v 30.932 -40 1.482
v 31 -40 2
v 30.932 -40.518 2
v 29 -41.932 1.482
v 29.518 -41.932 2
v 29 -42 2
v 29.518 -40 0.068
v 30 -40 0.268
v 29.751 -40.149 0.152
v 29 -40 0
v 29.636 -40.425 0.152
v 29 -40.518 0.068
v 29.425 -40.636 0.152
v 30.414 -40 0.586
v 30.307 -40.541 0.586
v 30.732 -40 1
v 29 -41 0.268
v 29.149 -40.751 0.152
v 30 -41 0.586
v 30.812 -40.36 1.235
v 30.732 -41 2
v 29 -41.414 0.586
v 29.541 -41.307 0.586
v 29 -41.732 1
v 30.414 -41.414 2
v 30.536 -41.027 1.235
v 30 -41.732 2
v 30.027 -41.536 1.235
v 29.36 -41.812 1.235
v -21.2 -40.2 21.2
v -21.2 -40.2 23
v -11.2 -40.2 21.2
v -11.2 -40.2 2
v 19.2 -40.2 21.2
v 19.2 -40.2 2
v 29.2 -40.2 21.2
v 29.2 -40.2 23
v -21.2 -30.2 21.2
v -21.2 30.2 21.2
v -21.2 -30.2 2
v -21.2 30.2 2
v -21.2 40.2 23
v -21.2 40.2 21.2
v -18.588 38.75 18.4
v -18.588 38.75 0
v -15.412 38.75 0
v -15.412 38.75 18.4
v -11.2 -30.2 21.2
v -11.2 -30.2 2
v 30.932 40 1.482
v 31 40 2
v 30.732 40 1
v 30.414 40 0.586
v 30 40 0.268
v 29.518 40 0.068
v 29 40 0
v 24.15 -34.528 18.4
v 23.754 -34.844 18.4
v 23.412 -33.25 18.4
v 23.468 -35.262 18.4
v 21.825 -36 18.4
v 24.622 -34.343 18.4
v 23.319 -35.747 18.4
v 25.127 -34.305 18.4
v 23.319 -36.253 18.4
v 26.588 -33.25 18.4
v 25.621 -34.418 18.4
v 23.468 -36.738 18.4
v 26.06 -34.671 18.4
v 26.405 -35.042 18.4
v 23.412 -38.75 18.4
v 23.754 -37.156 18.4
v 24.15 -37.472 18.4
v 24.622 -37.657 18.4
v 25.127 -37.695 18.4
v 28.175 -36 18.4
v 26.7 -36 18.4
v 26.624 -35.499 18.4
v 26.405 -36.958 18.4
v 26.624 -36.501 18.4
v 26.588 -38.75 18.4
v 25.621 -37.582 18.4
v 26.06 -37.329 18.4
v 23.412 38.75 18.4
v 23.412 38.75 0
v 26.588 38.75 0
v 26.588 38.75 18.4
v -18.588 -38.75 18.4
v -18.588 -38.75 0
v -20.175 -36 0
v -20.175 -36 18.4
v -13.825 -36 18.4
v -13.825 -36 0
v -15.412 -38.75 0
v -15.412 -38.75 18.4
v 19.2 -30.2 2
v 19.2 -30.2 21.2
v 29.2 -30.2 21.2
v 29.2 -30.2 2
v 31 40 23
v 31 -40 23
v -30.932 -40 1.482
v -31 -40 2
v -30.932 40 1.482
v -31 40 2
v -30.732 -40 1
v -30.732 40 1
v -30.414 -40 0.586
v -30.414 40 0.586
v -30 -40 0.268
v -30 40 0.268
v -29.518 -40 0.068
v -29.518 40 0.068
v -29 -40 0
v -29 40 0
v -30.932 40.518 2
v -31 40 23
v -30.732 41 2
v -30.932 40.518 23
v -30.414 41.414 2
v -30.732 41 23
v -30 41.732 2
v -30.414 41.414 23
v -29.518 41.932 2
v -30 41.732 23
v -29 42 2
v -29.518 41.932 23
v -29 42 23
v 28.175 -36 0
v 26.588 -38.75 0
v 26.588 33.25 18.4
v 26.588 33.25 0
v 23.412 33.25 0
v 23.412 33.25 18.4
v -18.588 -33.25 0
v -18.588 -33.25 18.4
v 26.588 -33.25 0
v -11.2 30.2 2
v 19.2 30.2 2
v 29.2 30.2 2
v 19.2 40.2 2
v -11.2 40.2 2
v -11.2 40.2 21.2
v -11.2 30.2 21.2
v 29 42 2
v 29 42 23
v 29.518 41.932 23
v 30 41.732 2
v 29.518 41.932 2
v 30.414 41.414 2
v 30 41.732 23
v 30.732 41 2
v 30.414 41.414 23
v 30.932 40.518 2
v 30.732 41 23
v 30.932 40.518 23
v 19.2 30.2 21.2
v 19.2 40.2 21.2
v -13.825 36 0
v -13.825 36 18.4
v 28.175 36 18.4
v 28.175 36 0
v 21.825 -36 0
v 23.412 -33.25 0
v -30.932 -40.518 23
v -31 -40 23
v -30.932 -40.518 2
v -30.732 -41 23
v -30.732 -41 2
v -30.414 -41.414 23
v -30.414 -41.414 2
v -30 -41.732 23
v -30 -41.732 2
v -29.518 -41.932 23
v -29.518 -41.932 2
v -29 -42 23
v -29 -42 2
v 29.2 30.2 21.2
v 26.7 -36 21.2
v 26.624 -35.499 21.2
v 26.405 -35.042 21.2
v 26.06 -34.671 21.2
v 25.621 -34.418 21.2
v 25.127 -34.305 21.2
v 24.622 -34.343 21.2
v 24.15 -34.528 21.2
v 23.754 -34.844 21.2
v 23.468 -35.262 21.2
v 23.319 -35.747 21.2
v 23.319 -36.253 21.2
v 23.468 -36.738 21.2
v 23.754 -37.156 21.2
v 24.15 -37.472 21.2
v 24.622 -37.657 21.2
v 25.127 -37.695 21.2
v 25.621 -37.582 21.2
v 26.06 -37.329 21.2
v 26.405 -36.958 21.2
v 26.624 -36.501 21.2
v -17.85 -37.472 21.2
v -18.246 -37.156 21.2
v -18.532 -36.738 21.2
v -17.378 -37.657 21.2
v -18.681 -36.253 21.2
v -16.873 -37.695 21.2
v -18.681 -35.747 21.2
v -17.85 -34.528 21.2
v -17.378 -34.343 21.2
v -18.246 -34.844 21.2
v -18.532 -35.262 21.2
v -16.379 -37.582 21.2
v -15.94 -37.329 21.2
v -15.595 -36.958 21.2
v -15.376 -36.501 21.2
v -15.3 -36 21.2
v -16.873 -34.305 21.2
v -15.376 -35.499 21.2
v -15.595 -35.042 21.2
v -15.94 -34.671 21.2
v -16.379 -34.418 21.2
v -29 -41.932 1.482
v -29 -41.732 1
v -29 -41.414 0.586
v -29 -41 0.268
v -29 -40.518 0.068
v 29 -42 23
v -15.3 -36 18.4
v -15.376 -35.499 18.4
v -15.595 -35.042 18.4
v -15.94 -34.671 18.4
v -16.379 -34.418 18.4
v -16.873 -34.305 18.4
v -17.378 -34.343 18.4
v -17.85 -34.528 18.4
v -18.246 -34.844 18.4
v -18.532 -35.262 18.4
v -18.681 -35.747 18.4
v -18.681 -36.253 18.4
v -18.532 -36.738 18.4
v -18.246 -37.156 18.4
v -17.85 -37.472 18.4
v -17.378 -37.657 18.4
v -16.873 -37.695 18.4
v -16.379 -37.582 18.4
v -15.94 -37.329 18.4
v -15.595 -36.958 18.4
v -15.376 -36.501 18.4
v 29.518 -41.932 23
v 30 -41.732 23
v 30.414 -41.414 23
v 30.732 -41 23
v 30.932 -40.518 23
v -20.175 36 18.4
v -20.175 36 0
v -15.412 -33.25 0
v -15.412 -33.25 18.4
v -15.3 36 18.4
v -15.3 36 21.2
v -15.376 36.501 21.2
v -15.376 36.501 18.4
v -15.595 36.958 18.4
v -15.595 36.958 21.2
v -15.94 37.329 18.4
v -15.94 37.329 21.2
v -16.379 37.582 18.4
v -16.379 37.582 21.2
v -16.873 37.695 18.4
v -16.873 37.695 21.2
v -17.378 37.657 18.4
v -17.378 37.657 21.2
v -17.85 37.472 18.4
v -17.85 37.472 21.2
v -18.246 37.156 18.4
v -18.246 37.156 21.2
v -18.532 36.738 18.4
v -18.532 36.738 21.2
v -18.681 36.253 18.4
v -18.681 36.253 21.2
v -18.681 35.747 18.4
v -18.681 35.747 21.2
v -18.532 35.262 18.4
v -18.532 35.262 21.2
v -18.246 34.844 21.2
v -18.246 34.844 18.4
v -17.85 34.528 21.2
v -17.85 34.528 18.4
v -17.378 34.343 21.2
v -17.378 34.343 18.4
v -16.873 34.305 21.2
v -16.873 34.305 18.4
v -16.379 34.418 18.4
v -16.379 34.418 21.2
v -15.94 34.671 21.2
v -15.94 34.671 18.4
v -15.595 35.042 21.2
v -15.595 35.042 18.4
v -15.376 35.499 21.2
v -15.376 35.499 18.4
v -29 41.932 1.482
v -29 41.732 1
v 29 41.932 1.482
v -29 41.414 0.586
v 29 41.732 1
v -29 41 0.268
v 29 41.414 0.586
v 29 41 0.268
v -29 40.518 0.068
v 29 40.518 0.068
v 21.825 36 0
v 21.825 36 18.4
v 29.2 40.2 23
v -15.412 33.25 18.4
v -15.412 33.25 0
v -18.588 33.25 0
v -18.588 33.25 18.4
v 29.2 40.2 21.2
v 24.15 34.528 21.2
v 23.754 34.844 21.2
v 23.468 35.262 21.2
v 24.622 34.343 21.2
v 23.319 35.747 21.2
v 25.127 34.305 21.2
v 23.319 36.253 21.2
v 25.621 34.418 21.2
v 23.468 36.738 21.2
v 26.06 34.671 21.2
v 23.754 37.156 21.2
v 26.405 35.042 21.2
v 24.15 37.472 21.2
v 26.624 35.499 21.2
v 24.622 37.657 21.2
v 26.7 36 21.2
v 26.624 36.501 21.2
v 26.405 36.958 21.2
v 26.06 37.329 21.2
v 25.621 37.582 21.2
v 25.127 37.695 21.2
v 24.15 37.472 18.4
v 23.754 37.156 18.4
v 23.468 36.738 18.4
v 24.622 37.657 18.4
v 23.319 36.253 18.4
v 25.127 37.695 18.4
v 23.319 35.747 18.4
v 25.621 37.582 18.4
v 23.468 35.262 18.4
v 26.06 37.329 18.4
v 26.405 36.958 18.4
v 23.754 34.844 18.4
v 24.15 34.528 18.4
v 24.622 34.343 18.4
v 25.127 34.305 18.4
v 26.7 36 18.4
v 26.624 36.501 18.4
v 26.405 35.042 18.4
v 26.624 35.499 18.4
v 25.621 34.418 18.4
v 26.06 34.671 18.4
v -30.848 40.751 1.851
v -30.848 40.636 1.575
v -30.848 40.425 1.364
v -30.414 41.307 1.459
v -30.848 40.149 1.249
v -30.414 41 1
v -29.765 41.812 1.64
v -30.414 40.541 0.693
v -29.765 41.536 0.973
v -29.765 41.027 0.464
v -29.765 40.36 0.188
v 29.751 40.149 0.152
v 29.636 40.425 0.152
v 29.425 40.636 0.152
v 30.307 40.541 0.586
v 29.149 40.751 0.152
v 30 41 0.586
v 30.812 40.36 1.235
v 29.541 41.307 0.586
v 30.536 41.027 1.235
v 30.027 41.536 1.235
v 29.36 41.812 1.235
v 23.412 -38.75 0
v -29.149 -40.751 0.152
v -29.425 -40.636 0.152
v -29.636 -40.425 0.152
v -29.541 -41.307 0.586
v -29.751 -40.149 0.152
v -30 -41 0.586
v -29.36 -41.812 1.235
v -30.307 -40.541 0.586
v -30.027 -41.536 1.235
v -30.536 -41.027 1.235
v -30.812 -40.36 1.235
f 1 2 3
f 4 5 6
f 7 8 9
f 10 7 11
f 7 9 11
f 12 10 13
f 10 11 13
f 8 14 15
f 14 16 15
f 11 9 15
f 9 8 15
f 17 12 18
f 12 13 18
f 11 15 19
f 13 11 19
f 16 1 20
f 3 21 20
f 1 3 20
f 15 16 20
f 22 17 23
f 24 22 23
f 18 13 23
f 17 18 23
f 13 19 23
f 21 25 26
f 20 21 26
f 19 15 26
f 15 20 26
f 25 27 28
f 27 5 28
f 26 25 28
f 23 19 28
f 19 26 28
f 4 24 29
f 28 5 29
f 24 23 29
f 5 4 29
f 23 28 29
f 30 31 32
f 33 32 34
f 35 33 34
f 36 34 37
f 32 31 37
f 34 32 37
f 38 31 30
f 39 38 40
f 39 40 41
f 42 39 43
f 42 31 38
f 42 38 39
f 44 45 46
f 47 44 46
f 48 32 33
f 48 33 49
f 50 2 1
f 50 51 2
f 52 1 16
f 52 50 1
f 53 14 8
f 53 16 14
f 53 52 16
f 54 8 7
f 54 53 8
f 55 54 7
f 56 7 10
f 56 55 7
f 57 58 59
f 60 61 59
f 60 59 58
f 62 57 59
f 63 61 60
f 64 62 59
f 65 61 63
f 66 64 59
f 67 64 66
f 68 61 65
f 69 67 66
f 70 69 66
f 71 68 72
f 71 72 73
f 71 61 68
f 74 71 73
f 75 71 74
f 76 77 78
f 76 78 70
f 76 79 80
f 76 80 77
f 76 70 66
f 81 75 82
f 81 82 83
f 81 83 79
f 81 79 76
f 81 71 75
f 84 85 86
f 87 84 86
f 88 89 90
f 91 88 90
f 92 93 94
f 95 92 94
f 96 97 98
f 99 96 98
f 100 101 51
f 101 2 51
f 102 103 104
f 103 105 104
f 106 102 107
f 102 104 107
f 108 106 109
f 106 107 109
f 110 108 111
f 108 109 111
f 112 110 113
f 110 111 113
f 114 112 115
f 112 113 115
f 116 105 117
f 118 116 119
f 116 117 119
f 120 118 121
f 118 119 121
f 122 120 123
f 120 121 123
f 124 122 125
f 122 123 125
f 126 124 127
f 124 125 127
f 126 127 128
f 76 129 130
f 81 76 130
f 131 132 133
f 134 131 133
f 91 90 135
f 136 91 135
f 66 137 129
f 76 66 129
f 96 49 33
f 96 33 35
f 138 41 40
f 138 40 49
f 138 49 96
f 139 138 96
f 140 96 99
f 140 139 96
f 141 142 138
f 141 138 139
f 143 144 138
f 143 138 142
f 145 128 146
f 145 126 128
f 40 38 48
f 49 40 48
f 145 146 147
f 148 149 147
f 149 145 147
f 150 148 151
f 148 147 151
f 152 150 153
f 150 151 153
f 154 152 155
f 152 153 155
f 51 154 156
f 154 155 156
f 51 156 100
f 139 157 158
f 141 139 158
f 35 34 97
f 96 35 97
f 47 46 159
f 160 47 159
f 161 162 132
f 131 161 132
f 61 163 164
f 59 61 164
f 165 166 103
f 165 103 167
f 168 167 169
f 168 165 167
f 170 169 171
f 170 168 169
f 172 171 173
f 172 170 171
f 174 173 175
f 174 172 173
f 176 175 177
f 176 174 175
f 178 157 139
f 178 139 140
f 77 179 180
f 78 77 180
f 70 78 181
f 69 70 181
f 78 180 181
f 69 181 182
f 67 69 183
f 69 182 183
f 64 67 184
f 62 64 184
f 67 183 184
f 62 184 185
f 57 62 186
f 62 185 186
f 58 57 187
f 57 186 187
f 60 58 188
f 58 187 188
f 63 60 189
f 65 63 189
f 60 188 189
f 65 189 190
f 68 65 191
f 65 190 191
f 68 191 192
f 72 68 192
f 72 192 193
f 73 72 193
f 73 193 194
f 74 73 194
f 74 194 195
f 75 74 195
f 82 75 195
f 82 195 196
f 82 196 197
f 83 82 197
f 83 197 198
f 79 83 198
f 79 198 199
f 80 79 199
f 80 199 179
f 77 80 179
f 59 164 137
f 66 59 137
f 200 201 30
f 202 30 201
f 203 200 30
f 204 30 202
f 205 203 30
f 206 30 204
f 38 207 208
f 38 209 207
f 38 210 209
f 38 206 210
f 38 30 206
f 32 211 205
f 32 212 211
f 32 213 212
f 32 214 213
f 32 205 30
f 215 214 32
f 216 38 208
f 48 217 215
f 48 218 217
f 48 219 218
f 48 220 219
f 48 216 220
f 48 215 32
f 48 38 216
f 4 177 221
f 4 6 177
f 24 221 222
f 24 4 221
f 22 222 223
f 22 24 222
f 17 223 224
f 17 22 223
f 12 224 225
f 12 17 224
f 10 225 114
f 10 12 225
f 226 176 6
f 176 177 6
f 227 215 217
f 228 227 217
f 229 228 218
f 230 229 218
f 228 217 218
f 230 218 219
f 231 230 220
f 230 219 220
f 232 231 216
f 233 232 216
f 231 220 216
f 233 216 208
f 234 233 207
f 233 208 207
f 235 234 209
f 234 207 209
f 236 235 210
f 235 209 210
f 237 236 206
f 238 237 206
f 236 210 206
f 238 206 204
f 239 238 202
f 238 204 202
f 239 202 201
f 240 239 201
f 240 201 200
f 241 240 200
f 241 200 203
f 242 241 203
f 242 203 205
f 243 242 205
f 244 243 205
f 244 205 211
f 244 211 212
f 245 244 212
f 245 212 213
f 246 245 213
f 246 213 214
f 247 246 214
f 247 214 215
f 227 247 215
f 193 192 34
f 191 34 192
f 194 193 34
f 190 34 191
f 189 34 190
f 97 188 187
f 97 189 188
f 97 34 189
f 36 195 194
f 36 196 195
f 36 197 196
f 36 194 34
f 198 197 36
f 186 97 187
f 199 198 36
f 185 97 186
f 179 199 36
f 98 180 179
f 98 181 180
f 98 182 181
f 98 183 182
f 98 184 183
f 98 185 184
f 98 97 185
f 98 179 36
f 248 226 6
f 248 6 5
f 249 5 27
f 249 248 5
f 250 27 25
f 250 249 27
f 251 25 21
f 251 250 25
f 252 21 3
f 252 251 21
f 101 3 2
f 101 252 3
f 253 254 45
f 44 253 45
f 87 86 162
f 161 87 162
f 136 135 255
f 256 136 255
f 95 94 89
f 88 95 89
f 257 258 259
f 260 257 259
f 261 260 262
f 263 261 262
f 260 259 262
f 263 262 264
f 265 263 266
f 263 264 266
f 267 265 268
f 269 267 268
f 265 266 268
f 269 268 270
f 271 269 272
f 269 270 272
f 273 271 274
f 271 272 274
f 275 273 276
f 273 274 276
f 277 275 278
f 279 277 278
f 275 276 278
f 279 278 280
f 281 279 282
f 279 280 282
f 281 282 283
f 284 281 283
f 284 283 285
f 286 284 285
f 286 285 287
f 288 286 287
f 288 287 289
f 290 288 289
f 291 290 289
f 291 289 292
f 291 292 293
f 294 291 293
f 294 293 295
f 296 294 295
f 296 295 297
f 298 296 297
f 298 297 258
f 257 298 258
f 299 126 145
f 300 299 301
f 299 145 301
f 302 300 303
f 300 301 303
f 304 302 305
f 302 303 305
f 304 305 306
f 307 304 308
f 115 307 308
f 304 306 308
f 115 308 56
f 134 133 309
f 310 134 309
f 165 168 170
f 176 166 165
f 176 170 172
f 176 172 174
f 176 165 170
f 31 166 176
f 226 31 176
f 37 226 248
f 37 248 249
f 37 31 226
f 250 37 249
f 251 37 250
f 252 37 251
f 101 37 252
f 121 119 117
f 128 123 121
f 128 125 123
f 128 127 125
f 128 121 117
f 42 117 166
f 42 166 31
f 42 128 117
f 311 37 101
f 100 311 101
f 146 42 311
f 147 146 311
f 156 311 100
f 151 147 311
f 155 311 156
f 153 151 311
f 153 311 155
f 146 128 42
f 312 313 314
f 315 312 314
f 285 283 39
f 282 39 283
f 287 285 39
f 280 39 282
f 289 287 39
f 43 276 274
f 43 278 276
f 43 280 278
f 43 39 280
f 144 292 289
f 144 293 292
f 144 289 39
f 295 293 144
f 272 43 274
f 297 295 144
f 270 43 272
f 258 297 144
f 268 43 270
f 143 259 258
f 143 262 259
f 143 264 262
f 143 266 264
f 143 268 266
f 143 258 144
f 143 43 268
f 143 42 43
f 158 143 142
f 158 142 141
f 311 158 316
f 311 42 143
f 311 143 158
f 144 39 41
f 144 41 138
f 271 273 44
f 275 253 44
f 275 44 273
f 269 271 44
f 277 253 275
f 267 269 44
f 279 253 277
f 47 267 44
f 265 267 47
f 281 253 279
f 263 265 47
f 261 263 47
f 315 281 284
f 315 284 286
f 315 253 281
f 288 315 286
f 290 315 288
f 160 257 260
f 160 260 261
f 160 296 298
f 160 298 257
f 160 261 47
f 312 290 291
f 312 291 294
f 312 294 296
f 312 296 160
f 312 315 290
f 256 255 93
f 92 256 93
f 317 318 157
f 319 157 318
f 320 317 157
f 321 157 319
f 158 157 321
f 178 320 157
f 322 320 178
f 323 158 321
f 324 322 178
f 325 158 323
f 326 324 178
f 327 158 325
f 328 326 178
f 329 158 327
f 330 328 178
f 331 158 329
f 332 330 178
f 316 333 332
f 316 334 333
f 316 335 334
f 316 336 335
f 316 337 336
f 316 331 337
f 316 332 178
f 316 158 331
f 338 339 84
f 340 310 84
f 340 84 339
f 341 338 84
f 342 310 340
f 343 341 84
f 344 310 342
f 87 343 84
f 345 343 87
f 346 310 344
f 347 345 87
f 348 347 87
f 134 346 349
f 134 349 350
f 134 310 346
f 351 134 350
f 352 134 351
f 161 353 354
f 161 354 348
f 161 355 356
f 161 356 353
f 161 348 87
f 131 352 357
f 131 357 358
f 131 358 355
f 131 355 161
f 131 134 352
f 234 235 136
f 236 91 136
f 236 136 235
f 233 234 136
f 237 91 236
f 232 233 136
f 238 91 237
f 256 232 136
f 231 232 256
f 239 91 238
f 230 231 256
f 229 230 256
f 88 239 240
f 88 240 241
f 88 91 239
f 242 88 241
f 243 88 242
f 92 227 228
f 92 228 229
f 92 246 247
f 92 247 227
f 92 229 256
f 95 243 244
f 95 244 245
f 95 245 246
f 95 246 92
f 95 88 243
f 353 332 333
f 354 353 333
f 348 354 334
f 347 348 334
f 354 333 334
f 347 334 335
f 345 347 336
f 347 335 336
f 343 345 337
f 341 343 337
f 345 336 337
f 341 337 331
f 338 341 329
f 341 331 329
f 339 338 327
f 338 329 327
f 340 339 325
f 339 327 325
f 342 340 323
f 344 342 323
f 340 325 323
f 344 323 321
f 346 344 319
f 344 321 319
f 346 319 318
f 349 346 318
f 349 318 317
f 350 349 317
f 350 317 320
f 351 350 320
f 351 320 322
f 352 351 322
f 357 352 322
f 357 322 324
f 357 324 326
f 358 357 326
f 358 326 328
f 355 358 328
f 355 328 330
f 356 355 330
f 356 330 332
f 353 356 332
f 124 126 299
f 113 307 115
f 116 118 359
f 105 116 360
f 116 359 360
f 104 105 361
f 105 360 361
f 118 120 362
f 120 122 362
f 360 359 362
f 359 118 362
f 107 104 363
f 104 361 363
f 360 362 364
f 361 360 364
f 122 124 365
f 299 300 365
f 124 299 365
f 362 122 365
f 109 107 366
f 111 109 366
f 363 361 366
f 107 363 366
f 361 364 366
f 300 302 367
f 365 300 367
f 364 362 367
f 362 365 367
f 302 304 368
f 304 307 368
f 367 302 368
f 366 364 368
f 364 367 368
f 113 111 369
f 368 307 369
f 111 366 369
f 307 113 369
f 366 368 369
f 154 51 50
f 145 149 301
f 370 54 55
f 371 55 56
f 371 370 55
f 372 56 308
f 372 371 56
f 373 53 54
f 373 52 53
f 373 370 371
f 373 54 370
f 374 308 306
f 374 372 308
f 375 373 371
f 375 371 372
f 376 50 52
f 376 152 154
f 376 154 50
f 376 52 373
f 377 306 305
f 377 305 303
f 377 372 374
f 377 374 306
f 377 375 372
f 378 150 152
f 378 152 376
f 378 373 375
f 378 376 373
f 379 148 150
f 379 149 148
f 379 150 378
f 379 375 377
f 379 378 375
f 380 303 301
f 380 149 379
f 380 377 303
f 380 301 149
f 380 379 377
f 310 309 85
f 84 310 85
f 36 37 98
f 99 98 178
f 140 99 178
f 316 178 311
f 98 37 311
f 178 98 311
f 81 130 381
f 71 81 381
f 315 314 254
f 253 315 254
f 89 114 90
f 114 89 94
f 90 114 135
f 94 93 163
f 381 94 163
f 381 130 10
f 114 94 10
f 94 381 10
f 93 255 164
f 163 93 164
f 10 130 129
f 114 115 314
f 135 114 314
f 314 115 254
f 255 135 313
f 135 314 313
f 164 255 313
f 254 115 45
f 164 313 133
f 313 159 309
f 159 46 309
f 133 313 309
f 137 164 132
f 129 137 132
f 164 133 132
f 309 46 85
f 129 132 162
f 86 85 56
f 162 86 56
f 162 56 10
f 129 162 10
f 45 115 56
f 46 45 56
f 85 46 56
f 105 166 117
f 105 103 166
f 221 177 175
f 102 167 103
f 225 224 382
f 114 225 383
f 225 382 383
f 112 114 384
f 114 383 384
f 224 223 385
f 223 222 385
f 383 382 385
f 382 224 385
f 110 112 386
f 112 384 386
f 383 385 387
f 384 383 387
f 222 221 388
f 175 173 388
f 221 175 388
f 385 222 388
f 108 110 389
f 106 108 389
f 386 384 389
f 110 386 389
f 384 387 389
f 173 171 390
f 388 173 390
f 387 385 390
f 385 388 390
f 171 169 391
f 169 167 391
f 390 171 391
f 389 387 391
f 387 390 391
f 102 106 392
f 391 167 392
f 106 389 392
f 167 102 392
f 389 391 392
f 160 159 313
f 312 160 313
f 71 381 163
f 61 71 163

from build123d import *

# Parameters (mm, degrees)
SKETCH024_W     = 62
SKETCH024_H     = 84
PAD007_DEPTH    = 23
SKETCH025_W     = 50.4
SKETCH025_H     = 80.4
POCKET015_DEPTH = 21
SKETCH026_W     = 10
SKETCH026_H     = 10
PAD008_DEPTH    = 19.2
SKETCH027_R     = 1.7
POCKET016_DEPTH = 21.2
POCKET017_DEPTH = 18.4
FILLET004_R     = 2


with BuildPart() as part:
    # Sketch024 → Pad007 (new body)
    with BuildSketch(Plane.XY):
        Rectangle(SKETCH024_W, SKETCH024_H)
    extrude(amount=PAD007_DEPTH)

    # Sketch025 (on Face6 of Pad007) → Pocket015 (cut)
    with BuildSketch(Plane.XY.offset(23)):
        with Locations((4, 0)):
            Rectangle(SKETCH025_W, SKETCH025_H)
    extrude(amount=-POCKET015_DEPTH, mode=Mode.SUBTRACT)

    # Sketch026 (on Face11 of Pocket015) → Pad008 (join)
    with BuildSketch(Plane.XY.offset(2)):
        with Locations((-16.2, 35.2)):
            Rectangle(SKETCH026_W, SKETCH026_H)
        with Locations((24.2, 35.2)):
            Rectangle(SKETCH026_W, SKETCH026_H)
        with Locations((24.2, -35.2)):
            Rectangle(SKETCH026_W, SKETCH026_H)
        with Locations((-16.2, -35.2)):
            Rectangle(SKETCH026_W, SKETCH026_H)
    extrude(amount=PAD008_DEPTH)

    # Sketch027 (on Face19 of Pad008) → Pocket016 (cut)
    with BuildSketch(Plane.XY.offset(21.2)):
        with Locations((25, 36)):
            Circle(SKETCH027_R)
        with Locations((-17, 36)):
            Circle(SKETCH027_R)
        with Locations((25, -36)):
            Circle(SKETCH027_R)
        with Locations((-17, -36)):
            Circle(SKETCH027_R)
    extrude(amount=-POCKET016_DEPTH, mode=Mode.SUBTRACT)

    # Sketch028 (on Face4 of Pocket016) → Pocket017 (cut)
    with BuildSketch(Plane(origin=(0, 0, 0), x_dir=(1, 0, 0), z_dir=(0, 0, -1))):
        Polygon((-15.412287, 33.25), (-13.824574, 36), (-15.412287, 38.75), (-18.587713, 38.75), (-20.175426, 36), (-18.587713, 33.25), align=None)
        Polygon((23.412287, 33.25), (26.587713, 33.25), (28.175426, 36), (26.587713, 38.75), (23.412287, 38.75), (21.824574, 36), align=None)
        Polygon((-15.412287, -33.25), (-18.587713, -33.25), (-20.175426, -36), (-18.587713, -38.75), (-15.412287, -38.75), (-13.824574, -36), align=None)
        Polygon((26.587713, -33.25), (23.412287, -33.25), (21.824574, -36), (23.412287, -38.75), (26.587713, -38.75), (28.175426, -36), align=None)
    extrude(amount=-POCKET017_DEPTH, mode=Mode.SUBTRACT)

    # Fillet004
    fillet004_edges = [part.edges().sort_by_distance(p)[0] for p in [
        (-31, -42, 11.5),
        (31, -42, 11.5),
        (31, 42, 11.5),
        (31, 0, 0),
        (0, -42, 0),
        (0, 42, 0),
        (-31, 42, 11.5),
        (-31, 0, 0),
    ]]
    fillet(fillet004_edges, radius=FILLET004_R)


solid = part.part
